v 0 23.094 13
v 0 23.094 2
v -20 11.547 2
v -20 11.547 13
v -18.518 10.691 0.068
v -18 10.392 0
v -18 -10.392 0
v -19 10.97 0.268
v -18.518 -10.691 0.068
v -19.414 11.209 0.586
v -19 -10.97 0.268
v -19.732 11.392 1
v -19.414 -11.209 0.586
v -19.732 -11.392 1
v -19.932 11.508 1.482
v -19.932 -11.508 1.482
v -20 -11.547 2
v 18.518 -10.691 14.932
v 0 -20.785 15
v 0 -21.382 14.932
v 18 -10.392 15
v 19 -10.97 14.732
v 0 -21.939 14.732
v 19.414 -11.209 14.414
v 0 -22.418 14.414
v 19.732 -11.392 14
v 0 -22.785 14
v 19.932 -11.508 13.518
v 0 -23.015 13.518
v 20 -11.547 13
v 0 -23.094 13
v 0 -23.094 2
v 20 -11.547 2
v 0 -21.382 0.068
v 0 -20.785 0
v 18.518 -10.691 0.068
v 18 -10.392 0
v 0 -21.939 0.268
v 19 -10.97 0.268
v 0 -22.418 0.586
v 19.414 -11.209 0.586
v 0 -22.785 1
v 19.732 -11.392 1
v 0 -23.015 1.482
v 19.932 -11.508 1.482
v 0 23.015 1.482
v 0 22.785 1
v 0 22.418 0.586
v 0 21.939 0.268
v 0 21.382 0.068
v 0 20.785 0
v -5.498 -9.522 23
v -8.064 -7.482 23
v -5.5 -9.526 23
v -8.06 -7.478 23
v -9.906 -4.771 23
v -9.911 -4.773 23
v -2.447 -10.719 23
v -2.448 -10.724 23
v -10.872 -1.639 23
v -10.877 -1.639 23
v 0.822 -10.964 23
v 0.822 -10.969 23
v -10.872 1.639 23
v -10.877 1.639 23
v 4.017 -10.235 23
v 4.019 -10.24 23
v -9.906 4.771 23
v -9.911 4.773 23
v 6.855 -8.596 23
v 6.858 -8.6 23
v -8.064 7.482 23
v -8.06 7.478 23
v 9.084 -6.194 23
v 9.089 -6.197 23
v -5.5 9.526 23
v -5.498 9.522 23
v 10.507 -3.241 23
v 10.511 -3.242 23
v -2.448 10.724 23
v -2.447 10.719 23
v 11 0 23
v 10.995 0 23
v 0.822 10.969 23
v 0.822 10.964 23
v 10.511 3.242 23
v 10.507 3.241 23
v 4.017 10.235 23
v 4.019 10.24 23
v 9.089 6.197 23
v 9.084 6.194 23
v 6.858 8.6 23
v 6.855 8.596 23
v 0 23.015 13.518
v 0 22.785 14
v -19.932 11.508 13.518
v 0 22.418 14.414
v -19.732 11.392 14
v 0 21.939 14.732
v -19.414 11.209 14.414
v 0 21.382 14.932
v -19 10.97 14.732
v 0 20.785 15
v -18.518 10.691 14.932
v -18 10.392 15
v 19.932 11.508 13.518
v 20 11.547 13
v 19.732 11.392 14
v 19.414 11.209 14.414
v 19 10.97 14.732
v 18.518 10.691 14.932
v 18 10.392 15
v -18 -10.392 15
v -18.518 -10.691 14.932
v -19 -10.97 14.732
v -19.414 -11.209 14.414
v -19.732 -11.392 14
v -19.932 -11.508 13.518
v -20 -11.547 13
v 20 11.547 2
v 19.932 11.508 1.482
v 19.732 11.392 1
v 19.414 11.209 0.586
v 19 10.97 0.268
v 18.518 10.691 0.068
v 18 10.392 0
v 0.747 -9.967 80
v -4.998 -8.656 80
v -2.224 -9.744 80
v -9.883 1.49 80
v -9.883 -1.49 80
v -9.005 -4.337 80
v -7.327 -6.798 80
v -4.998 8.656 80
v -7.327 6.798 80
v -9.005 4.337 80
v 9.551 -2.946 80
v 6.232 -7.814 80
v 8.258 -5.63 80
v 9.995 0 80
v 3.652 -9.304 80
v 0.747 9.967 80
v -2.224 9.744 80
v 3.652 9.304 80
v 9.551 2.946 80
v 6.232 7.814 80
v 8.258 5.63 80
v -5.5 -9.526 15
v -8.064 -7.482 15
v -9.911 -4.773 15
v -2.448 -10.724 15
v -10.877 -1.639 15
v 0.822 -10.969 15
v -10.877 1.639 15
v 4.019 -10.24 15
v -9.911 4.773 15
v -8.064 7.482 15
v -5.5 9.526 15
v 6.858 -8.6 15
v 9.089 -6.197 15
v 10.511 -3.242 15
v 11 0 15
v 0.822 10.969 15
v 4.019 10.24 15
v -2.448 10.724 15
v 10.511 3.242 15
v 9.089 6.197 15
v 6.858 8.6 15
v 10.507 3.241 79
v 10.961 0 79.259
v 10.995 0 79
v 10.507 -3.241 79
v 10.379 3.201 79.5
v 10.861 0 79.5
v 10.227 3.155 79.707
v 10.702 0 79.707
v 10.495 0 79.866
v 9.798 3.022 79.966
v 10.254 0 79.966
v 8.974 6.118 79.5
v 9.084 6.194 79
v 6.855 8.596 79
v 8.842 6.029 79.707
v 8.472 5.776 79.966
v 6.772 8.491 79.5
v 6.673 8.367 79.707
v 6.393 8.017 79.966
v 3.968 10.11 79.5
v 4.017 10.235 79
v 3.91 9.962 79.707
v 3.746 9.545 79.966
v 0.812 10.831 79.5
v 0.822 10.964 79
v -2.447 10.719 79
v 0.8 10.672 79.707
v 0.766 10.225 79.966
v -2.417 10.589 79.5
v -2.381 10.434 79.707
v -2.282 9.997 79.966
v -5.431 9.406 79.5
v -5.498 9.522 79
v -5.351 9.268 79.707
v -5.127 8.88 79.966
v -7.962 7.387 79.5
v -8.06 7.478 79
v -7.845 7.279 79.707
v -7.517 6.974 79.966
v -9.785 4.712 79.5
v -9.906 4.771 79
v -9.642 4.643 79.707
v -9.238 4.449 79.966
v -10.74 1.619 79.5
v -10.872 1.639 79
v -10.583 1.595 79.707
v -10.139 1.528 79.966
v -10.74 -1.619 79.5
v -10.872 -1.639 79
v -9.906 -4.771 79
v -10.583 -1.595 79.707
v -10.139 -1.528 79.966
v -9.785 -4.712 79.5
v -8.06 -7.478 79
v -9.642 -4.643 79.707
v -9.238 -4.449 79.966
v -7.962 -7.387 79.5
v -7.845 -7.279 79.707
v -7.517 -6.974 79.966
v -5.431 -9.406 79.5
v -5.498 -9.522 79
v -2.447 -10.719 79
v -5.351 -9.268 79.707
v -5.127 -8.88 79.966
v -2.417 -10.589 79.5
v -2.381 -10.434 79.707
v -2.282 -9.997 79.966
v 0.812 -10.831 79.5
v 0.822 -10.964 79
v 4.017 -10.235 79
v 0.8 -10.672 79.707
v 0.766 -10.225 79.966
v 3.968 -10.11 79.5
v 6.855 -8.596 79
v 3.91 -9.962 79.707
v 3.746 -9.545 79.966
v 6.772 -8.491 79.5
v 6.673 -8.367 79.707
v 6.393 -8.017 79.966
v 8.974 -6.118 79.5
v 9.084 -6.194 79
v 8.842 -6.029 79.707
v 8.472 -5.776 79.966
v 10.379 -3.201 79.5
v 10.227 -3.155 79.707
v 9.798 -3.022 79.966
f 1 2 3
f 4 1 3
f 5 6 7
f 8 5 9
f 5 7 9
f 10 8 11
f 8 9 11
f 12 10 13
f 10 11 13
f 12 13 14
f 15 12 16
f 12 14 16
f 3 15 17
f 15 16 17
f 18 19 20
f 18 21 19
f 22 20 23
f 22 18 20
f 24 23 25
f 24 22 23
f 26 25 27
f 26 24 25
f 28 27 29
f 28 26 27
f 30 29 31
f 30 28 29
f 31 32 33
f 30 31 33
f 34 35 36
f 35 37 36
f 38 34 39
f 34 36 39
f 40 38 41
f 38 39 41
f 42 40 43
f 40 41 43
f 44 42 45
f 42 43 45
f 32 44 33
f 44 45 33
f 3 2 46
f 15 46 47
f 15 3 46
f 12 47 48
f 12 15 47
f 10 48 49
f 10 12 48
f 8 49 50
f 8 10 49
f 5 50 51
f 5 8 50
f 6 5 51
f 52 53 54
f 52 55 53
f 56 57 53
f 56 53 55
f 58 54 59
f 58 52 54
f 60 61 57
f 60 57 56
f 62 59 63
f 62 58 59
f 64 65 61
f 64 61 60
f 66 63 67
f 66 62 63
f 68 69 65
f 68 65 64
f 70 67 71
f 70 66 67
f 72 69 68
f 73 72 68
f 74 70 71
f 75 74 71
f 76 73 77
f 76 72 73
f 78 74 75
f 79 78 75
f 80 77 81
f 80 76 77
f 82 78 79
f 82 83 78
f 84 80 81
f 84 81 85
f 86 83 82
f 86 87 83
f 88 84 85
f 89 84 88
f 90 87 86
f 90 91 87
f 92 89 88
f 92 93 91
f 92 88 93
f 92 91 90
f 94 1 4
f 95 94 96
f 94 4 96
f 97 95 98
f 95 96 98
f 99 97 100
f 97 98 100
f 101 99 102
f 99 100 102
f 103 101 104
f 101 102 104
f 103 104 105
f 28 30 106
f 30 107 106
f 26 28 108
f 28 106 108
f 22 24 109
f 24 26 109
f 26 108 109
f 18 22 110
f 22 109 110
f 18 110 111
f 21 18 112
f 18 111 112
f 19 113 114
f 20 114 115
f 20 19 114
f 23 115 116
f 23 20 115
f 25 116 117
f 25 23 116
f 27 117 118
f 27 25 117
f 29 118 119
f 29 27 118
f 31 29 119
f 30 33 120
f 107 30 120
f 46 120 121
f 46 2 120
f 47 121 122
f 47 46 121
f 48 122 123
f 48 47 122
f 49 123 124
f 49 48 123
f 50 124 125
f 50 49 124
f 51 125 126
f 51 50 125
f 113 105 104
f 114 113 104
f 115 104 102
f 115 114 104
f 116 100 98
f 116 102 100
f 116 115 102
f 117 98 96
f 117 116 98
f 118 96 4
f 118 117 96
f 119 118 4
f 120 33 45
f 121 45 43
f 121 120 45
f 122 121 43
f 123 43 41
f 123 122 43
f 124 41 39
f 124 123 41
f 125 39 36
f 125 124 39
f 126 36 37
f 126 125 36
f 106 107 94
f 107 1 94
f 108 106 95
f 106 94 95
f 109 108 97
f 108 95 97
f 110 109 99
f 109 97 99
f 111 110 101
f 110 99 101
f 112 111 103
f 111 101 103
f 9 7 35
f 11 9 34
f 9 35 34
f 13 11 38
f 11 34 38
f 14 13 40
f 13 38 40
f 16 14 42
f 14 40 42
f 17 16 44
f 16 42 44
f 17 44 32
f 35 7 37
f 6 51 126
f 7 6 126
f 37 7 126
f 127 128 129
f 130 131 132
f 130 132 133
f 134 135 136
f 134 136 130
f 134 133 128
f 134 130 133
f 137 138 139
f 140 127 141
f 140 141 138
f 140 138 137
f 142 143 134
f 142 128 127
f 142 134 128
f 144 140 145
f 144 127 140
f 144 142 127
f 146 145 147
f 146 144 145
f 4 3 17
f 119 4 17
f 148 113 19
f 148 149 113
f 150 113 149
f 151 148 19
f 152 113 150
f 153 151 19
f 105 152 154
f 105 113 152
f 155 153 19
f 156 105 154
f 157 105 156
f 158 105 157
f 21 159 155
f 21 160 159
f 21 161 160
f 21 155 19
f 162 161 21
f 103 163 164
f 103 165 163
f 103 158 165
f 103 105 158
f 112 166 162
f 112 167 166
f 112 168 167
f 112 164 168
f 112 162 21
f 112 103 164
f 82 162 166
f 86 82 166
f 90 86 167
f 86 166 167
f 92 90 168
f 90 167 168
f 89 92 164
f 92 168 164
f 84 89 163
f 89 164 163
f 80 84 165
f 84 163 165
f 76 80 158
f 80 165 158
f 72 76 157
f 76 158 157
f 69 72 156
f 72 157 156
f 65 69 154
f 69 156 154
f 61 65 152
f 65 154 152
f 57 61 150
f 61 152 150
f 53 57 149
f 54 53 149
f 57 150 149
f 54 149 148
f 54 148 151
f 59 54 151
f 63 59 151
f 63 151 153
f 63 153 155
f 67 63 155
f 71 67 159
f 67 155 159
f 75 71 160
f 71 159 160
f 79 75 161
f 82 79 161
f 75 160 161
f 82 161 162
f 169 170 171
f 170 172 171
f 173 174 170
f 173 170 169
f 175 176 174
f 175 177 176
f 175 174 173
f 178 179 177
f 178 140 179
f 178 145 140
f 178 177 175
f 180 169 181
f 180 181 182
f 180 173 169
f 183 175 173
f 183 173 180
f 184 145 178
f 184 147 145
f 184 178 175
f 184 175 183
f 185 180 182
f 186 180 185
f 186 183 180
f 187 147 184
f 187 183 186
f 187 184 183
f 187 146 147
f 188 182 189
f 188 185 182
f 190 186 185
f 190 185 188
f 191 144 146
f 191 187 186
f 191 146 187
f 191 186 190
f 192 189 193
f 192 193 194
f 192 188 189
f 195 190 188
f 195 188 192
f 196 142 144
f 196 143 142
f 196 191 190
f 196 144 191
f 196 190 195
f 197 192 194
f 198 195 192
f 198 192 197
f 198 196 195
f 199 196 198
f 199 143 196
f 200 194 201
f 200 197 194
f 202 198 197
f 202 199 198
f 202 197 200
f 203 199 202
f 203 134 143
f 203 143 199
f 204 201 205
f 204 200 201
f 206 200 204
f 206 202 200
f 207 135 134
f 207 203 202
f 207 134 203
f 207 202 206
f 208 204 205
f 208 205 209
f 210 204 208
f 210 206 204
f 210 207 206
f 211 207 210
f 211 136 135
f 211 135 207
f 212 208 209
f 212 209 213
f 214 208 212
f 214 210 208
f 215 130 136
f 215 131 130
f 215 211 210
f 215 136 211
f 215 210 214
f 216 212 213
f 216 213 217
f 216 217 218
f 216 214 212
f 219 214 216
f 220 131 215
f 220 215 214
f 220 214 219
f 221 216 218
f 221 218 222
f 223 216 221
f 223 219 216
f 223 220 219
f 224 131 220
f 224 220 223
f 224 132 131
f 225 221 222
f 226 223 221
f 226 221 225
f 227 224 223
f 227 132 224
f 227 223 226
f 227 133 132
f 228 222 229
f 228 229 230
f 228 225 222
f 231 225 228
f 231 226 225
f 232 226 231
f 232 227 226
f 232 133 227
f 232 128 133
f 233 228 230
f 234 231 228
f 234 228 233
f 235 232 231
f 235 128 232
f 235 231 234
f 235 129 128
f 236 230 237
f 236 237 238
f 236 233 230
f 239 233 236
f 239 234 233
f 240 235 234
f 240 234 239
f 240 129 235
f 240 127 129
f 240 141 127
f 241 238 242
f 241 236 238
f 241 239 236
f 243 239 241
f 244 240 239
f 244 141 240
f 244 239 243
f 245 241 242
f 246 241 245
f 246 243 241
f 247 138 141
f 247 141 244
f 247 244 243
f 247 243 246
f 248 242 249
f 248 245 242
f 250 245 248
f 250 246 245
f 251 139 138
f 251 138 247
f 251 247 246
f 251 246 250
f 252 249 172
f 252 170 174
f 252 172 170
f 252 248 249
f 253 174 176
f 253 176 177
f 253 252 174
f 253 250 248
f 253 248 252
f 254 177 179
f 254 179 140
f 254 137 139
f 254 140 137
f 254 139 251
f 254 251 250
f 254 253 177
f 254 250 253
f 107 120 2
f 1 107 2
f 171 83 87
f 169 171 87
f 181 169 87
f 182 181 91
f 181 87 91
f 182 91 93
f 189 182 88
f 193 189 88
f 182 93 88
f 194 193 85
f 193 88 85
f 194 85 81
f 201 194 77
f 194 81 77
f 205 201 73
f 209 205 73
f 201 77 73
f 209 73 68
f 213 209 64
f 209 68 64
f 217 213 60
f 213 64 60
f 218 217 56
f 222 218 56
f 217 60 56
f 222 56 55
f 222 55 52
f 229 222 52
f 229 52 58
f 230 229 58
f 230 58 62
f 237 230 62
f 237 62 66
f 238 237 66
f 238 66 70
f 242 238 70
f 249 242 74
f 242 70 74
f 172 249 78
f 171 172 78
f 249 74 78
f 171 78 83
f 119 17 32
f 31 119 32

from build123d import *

# Parameters (mm, degrees)
EXTRUDE_437_DEPTH = 15
SKETCH_2_R        = 11
EXTRUDE_1_DEPTH   = 8
FILLET_3_R        = 2
SKETCH_3_R        = 10.995
EXTRUDE_1_2_DEPTH = 57
FILLET_4_R        = 1


with BuildPart() as part:
    # 草图1 → Extrude 437 (new body)
    with BuildSketch(Plane.XY):
        Polygon((20, 11.547005384), (0, 23.094010768), (-20, 11.547005384), (-20, -11.547005384), (0, -23.094010768), (20, -11.547005384), align=None)
    extrude(amount=EXTRUDE_437_DEPTH)

    # 草图2 → Extrude 1 (add)
    with BuildSketch(Plane.XY.offset(15)):
        Circle(SKETCH_2_R)
    extrude(amount=EXTRUDE_1_DEPTH)

    # 圆角3
    fillet_3_edges = [part.edges().sort_by_distance(p)[0] for p in [
        (-10, 17.320508076, 15),
        (-20, 0, 15),
        (-10, -17.320508076, 15),
        (10, -17.320508076, 15),
        (20, 0, 15),
        (10, -17.320508076, 0),
        (-10, -17.320508076, 0),
        (-20, 0, 0),
        (10, 17.320508076, 15),
        (-10, 17.320508076, 0),
        (10, 17.320508076, 0),
        (20, 0, 0),
    ]]
    fillet(fillet_3_edges, radius=FILLET_3_R)

    # 草图3 → Extrude 1 2 (add)
    with BuildSketch(Plane.XY.offset(23)):
        Circle(SKETCH_3_R)
    extrude(amount=EXTRUDE_1_2_DEPTH)

    # 圆角4
    fillet_4_edges = [part.edges().sort_by_distance(p)[0] for p in [
        (-10.995, 0, 80),
    ]]
    fillet(fillet_4_edges, radius=FILLET_4_R)


solid = part.part
